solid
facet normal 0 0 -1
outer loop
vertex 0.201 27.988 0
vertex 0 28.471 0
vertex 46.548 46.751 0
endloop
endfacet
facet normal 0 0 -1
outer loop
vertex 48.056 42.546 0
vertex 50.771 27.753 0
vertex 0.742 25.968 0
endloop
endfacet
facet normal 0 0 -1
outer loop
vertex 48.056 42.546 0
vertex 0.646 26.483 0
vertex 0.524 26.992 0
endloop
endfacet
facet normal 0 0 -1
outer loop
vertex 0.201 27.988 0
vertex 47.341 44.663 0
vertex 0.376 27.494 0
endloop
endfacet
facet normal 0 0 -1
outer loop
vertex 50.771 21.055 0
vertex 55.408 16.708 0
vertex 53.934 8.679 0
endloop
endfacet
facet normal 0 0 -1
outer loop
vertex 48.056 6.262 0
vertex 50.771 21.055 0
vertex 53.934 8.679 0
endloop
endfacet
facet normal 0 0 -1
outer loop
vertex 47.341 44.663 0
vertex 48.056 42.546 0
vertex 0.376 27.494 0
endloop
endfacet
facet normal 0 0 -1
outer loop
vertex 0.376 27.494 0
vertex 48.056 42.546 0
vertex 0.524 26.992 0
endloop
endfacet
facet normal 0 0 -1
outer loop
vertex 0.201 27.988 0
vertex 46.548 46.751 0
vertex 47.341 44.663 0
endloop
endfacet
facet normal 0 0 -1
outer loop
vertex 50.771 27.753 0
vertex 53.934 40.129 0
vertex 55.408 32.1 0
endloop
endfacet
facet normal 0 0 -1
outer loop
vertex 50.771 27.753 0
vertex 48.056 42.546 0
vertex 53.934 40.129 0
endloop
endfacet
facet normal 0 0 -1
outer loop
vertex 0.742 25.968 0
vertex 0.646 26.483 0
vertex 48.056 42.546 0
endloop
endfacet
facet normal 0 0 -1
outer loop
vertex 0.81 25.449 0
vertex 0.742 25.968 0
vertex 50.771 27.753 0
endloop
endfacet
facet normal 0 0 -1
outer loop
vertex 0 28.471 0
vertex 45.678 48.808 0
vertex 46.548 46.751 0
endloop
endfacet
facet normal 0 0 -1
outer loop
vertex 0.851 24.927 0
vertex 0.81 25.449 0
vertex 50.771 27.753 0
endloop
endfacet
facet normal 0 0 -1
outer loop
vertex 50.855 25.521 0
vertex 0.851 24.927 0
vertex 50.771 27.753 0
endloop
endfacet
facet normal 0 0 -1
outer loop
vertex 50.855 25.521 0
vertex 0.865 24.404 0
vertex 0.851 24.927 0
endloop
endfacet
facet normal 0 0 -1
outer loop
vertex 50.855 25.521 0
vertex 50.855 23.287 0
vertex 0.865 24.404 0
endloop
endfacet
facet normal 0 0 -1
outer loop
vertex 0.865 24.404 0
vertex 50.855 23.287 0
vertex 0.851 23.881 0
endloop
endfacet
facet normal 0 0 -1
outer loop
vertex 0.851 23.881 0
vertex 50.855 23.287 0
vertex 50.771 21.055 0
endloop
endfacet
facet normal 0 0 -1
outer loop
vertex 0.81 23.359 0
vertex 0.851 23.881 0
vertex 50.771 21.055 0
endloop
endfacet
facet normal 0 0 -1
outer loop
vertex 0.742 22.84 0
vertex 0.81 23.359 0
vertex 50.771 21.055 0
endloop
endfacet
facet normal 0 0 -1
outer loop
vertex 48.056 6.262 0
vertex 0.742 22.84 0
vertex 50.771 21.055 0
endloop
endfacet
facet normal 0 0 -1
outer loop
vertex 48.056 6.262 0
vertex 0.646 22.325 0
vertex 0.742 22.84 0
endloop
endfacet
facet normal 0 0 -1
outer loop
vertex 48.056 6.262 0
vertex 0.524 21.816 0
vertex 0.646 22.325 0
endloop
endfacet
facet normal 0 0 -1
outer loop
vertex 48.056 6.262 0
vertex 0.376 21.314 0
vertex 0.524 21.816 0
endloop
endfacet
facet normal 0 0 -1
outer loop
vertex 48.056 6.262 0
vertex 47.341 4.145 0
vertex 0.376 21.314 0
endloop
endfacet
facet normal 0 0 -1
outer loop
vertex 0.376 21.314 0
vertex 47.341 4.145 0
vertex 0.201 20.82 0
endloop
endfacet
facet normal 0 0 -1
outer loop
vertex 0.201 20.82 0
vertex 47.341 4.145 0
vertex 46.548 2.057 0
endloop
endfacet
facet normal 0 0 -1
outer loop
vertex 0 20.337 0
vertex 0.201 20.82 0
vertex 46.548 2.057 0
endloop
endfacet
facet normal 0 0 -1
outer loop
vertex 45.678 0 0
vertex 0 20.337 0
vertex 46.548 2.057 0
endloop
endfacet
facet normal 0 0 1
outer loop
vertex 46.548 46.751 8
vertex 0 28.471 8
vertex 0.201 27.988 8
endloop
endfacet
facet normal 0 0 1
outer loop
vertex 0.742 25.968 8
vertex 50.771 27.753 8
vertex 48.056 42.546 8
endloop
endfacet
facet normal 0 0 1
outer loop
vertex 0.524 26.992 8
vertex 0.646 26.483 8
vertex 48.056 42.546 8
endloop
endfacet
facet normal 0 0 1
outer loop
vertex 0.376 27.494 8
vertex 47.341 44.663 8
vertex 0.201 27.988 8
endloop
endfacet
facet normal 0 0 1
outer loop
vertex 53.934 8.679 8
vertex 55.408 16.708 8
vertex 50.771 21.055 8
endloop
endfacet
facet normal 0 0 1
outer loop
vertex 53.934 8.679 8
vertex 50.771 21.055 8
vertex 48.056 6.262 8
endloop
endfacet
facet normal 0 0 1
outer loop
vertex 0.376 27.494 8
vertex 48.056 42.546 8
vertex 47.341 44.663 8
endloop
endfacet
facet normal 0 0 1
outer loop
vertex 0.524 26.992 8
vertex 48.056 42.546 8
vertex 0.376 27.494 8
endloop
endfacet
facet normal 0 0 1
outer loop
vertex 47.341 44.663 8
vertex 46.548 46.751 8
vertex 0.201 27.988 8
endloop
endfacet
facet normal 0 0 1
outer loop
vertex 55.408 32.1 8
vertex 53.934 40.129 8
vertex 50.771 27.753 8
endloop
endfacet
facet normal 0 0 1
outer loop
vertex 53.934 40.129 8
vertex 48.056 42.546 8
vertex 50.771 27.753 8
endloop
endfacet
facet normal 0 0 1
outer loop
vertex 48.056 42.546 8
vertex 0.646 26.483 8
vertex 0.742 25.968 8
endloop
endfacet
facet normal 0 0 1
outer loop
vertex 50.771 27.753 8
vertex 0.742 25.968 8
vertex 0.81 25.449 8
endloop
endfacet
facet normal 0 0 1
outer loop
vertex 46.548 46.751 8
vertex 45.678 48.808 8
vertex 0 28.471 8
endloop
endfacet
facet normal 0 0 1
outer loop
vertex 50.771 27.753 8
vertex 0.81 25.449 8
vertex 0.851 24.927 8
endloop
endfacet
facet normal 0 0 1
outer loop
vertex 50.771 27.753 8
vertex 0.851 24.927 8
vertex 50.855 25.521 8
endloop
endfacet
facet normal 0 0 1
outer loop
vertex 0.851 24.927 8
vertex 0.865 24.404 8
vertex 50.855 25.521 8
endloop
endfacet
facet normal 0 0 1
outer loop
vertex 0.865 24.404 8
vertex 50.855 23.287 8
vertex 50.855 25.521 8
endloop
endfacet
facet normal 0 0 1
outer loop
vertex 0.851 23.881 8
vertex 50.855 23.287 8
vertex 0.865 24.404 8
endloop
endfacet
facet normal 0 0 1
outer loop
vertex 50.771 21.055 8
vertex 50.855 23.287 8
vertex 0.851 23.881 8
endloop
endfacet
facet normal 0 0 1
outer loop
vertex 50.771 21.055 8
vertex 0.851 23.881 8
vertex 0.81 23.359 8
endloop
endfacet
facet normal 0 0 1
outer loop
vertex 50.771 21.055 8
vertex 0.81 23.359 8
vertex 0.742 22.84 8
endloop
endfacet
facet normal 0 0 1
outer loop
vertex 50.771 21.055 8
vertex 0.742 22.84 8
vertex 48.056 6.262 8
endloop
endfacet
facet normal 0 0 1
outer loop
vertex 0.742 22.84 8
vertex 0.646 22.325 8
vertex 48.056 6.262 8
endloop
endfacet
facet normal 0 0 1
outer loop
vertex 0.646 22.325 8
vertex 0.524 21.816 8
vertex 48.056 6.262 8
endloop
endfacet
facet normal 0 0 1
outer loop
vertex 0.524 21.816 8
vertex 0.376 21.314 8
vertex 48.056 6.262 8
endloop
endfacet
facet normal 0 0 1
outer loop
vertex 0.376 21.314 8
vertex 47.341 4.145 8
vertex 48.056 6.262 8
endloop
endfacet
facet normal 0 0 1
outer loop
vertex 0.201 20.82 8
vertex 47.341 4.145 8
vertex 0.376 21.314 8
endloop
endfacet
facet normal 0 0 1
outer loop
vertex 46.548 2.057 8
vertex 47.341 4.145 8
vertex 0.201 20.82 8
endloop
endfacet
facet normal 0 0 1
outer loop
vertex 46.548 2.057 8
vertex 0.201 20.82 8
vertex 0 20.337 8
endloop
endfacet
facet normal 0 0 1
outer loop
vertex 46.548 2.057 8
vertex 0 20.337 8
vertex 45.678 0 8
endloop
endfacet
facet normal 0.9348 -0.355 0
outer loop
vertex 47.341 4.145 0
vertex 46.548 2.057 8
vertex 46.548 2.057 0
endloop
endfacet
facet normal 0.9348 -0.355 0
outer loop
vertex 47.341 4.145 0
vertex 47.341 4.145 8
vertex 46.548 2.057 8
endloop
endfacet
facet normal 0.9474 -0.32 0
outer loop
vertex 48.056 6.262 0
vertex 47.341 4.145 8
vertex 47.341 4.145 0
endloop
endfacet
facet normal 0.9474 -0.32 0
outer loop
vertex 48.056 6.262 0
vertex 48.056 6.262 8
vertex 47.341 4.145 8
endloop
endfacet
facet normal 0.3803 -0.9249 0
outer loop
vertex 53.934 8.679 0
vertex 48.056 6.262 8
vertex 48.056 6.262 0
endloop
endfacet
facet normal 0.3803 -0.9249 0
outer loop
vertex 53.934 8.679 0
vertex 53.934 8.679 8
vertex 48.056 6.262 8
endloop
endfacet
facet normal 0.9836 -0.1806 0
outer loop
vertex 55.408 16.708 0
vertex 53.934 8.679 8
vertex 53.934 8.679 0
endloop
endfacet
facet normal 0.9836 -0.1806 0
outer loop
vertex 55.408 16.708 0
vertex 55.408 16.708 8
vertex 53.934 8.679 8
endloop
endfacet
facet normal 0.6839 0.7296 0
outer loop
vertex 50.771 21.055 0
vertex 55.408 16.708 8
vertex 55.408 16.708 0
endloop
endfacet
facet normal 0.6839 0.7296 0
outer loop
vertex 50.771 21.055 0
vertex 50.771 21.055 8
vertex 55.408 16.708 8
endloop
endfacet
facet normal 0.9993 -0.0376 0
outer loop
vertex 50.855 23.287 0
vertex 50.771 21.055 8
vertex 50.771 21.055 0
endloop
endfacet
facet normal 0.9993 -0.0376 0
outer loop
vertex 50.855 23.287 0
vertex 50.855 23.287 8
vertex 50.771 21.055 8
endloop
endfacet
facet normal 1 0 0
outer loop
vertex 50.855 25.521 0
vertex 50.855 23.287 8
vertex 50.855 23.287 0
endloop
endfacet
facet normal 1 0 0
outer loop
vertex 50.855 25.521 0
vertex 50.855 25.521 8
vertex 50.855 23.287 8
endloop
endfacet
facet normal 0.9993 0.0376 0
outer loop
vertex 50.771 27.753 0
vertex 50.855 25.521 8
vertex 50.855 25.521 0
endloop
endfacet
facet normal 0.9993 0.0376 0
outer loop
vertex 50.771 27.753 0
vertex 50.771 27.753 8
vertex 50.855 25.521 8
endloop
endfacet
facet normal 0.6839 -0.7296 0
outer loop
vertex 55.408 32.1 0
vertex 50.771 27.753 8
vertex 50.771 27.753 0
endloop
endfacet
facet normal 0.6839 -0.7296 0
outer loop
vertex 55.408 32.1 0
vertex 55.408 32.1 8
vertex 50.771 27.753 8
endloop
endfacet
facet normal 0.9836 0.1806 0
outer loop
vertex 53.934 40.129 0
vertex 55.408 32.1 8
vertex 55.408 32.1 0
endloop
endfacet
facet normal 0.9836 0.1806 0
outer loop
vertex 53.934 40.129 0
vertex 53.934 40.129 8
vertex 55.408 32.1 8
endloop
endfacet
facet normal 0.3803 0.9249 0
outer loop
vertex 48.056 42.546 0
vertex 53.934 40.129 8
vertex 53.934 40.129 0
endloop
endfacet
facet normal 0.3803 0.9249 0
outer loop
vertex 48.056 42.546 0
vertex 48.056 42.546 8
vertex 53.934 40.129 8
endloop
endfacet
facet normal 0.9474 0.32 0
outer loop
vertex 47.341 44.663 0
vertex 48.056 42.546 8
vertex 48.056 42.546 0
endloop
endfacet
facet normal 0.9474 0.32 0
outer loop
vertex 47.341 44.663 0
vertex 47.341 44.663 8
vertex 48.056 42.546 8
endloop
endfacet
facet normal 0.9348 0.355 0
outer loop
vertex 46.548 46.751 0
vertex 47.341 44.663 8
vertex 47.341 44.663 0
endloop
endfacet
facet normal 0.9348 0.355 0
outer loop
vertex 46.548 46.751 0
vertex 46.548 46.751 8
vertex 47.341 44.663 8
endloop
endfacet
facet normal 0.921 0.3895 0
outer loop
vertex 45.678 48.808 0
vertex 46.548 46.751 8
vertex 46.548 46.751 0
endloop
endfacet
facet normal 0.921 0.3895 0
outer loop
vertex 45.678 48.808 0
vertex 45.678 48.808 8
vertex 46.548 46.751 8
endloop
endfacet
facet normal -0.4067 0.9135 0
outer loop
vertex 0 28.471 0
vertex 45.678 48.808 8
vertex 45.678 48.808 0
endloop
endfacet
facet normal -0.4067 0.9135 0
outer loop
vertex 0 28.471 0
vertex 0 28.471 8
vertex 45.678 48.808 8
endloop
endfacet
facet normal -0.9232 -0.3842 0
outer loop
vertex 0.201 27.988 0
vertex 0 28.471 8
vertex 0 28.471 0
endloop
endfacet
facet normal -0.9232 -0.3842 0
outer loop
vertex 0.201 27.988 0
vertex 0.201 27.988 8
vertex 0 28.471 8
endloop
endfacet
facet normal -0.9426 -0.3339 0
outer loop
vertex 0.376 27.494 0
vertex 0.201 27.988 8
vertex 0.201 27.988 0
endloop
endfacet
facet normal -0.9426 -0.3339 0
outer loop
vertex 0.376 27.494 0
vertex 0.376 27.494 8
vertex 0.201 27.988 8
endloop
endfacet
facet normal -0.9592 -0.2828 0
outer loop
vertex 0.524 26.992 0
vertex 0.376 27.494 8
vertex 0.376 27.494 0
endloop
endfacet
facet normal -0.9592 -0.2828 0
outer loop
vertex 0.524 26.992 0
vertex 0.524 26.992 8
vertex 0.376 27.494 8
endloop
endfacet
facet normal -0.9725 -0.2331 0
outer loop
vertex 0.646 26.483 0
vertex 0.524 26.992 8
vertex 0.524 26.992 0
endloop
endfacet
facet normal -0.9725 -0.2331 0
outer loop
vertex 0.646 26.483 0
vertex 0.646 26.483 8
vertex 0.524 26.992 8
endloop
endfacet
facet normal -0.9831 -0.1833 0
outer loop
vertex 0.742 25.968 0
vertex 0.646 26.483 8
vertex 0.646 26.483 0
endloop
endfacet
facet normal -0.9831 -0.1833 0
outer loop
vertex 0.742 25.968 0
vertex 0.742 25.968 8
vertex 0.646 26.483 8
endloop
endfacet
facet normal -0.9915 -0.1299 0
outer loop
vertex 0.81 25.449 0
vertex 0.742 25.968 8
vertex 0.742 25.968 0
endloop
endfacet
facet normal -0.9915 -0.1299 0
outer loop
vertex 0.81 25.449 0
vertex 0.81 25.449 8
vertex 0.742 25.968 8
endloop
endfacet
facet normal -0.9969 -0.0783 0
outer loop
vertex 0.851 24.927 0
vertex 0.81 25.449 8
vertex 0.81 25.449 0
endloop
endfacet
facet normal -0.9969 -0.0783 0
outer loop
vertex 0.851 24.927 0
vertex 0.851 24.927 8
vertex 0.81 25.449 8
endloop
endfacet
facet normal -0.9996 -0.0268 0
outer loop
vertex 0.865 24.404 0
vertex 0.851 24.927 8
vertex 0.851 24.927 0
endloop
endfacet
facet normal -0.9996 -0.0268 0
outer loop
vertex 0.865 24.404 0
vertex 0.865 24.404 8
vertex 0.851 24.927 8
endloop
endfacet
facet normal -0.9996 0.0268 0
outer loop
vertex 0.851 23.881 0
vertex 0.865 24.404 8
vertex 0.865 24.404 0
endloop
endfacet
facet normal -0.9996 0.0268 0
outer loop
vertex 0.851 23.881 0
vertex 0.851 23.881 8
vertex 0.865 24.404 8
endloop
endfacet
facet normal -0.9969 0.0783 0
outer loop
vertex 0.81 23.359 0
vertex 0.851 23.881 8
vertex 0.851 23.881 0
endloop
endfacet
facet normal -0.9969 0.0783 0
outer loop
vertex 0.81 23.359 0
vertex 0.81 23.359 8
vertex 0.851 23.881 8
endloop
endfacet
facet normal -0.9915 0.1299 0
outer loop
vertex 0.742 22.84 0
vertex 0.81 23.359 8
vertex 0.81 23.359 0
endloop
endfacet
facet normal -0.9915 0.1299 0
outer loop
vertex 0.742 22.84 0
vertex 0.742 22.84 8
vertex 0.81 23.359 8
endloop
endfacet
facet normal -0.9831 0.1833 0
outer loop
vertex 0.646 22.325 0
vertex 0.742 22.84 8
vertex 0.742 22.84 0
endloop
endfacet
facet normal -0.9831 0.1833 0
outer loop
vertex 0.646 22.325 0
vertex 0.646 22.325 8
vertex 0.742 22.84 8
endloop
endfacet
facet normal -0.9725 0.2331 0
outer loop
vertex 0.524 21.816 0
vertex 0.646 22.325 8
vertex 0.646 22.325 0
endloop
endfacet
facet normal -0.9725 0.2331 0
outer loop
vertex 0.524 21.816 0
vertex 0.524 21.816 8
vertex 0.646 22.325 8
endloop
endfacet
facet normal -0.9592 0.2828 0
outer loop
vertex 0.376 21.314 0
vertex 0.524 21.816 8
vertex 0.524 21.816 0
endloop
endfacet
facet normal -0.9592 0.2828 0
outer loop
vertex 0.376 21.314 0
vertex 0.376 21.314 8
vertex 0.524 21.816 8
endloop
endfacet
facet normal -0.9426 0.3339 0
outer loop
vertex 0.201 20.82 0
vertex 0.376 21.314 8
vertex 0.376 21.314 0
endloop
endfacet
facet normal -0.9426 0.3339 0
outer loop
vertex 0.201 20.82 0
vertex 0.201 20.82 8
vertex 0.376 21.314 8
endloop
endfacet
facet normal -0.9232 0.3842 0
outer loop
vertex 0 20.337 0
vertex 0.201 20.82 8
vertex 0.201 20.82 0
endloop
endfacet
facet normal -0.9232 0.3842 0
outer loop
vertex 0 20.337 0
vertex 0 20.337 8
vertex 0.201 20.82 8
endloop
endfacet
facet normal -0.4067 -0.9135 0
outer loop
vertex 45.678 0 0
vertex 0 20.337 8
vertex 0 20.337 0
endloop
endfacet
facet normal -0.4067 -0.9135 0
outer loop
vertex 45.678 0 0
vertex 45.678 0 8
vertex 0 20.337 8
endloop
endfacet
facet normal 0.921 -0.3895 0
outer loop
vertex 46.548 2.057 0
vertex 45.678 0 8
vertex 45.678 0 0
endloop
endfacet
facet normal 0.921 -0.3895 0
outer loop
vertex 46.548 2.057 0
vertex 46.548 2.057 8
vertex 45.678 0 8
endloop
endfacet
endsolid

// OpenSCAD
$fn = 32;

// ----------------------------------------------------------------------
// Gear sector: 2 teeth on 48 degrees
// ----------------------------------------------------------------------

// --- parameters (mm) ---
sector_angle = 48;        // sector angle, degrees
root_r = 60;              // root circle radius
tooth_h = 5;              // tooth height over the root circle
teeth = 2;                // number of teeth on the sector
hub_r = 10;               // hub bore radius
plate_t = 8;              // sector thickness, Z
arc_step = 3;             // sampling step of the root/hub arcs, degrees

tip_r = root_r + tooth_h;  // tip circle radius

profile = [[45.678, 0], [46.548, 2.057], [47.341, 4.145], [48.056, 6.262], [53.934, 8.679], [55.408, 16.708], [50.771, 21.055], [50.855, 23.287], [50.855, 25.521], [50.771, 27.753], [55.408, 32.1], [53.934, 40.129], [48.056, 42.546], [47.341, 44.663], [46.548, 46.751], [45.678, 48.808], [0, 28.471], [0.201, 27.988], [0.376, 27.494], [0.524, 26.992], [0.646, 26.483], [0.742, 25.968], [0.81, 25.449], [0.851, 24.927], [0.865, 24.404], [0.851, 23.881], [0.81, 23.359], [0.742, 22.84], [0.646, 22.325], [0.524, 21.816], [0.376, 21.314], [0.201, 20.82], [0, 20.337]];  // primary outline, 33 points, counter clockwise

// --- the one profile operation ---
linear_extrude(height = plate_t) polygon(points = profile);
